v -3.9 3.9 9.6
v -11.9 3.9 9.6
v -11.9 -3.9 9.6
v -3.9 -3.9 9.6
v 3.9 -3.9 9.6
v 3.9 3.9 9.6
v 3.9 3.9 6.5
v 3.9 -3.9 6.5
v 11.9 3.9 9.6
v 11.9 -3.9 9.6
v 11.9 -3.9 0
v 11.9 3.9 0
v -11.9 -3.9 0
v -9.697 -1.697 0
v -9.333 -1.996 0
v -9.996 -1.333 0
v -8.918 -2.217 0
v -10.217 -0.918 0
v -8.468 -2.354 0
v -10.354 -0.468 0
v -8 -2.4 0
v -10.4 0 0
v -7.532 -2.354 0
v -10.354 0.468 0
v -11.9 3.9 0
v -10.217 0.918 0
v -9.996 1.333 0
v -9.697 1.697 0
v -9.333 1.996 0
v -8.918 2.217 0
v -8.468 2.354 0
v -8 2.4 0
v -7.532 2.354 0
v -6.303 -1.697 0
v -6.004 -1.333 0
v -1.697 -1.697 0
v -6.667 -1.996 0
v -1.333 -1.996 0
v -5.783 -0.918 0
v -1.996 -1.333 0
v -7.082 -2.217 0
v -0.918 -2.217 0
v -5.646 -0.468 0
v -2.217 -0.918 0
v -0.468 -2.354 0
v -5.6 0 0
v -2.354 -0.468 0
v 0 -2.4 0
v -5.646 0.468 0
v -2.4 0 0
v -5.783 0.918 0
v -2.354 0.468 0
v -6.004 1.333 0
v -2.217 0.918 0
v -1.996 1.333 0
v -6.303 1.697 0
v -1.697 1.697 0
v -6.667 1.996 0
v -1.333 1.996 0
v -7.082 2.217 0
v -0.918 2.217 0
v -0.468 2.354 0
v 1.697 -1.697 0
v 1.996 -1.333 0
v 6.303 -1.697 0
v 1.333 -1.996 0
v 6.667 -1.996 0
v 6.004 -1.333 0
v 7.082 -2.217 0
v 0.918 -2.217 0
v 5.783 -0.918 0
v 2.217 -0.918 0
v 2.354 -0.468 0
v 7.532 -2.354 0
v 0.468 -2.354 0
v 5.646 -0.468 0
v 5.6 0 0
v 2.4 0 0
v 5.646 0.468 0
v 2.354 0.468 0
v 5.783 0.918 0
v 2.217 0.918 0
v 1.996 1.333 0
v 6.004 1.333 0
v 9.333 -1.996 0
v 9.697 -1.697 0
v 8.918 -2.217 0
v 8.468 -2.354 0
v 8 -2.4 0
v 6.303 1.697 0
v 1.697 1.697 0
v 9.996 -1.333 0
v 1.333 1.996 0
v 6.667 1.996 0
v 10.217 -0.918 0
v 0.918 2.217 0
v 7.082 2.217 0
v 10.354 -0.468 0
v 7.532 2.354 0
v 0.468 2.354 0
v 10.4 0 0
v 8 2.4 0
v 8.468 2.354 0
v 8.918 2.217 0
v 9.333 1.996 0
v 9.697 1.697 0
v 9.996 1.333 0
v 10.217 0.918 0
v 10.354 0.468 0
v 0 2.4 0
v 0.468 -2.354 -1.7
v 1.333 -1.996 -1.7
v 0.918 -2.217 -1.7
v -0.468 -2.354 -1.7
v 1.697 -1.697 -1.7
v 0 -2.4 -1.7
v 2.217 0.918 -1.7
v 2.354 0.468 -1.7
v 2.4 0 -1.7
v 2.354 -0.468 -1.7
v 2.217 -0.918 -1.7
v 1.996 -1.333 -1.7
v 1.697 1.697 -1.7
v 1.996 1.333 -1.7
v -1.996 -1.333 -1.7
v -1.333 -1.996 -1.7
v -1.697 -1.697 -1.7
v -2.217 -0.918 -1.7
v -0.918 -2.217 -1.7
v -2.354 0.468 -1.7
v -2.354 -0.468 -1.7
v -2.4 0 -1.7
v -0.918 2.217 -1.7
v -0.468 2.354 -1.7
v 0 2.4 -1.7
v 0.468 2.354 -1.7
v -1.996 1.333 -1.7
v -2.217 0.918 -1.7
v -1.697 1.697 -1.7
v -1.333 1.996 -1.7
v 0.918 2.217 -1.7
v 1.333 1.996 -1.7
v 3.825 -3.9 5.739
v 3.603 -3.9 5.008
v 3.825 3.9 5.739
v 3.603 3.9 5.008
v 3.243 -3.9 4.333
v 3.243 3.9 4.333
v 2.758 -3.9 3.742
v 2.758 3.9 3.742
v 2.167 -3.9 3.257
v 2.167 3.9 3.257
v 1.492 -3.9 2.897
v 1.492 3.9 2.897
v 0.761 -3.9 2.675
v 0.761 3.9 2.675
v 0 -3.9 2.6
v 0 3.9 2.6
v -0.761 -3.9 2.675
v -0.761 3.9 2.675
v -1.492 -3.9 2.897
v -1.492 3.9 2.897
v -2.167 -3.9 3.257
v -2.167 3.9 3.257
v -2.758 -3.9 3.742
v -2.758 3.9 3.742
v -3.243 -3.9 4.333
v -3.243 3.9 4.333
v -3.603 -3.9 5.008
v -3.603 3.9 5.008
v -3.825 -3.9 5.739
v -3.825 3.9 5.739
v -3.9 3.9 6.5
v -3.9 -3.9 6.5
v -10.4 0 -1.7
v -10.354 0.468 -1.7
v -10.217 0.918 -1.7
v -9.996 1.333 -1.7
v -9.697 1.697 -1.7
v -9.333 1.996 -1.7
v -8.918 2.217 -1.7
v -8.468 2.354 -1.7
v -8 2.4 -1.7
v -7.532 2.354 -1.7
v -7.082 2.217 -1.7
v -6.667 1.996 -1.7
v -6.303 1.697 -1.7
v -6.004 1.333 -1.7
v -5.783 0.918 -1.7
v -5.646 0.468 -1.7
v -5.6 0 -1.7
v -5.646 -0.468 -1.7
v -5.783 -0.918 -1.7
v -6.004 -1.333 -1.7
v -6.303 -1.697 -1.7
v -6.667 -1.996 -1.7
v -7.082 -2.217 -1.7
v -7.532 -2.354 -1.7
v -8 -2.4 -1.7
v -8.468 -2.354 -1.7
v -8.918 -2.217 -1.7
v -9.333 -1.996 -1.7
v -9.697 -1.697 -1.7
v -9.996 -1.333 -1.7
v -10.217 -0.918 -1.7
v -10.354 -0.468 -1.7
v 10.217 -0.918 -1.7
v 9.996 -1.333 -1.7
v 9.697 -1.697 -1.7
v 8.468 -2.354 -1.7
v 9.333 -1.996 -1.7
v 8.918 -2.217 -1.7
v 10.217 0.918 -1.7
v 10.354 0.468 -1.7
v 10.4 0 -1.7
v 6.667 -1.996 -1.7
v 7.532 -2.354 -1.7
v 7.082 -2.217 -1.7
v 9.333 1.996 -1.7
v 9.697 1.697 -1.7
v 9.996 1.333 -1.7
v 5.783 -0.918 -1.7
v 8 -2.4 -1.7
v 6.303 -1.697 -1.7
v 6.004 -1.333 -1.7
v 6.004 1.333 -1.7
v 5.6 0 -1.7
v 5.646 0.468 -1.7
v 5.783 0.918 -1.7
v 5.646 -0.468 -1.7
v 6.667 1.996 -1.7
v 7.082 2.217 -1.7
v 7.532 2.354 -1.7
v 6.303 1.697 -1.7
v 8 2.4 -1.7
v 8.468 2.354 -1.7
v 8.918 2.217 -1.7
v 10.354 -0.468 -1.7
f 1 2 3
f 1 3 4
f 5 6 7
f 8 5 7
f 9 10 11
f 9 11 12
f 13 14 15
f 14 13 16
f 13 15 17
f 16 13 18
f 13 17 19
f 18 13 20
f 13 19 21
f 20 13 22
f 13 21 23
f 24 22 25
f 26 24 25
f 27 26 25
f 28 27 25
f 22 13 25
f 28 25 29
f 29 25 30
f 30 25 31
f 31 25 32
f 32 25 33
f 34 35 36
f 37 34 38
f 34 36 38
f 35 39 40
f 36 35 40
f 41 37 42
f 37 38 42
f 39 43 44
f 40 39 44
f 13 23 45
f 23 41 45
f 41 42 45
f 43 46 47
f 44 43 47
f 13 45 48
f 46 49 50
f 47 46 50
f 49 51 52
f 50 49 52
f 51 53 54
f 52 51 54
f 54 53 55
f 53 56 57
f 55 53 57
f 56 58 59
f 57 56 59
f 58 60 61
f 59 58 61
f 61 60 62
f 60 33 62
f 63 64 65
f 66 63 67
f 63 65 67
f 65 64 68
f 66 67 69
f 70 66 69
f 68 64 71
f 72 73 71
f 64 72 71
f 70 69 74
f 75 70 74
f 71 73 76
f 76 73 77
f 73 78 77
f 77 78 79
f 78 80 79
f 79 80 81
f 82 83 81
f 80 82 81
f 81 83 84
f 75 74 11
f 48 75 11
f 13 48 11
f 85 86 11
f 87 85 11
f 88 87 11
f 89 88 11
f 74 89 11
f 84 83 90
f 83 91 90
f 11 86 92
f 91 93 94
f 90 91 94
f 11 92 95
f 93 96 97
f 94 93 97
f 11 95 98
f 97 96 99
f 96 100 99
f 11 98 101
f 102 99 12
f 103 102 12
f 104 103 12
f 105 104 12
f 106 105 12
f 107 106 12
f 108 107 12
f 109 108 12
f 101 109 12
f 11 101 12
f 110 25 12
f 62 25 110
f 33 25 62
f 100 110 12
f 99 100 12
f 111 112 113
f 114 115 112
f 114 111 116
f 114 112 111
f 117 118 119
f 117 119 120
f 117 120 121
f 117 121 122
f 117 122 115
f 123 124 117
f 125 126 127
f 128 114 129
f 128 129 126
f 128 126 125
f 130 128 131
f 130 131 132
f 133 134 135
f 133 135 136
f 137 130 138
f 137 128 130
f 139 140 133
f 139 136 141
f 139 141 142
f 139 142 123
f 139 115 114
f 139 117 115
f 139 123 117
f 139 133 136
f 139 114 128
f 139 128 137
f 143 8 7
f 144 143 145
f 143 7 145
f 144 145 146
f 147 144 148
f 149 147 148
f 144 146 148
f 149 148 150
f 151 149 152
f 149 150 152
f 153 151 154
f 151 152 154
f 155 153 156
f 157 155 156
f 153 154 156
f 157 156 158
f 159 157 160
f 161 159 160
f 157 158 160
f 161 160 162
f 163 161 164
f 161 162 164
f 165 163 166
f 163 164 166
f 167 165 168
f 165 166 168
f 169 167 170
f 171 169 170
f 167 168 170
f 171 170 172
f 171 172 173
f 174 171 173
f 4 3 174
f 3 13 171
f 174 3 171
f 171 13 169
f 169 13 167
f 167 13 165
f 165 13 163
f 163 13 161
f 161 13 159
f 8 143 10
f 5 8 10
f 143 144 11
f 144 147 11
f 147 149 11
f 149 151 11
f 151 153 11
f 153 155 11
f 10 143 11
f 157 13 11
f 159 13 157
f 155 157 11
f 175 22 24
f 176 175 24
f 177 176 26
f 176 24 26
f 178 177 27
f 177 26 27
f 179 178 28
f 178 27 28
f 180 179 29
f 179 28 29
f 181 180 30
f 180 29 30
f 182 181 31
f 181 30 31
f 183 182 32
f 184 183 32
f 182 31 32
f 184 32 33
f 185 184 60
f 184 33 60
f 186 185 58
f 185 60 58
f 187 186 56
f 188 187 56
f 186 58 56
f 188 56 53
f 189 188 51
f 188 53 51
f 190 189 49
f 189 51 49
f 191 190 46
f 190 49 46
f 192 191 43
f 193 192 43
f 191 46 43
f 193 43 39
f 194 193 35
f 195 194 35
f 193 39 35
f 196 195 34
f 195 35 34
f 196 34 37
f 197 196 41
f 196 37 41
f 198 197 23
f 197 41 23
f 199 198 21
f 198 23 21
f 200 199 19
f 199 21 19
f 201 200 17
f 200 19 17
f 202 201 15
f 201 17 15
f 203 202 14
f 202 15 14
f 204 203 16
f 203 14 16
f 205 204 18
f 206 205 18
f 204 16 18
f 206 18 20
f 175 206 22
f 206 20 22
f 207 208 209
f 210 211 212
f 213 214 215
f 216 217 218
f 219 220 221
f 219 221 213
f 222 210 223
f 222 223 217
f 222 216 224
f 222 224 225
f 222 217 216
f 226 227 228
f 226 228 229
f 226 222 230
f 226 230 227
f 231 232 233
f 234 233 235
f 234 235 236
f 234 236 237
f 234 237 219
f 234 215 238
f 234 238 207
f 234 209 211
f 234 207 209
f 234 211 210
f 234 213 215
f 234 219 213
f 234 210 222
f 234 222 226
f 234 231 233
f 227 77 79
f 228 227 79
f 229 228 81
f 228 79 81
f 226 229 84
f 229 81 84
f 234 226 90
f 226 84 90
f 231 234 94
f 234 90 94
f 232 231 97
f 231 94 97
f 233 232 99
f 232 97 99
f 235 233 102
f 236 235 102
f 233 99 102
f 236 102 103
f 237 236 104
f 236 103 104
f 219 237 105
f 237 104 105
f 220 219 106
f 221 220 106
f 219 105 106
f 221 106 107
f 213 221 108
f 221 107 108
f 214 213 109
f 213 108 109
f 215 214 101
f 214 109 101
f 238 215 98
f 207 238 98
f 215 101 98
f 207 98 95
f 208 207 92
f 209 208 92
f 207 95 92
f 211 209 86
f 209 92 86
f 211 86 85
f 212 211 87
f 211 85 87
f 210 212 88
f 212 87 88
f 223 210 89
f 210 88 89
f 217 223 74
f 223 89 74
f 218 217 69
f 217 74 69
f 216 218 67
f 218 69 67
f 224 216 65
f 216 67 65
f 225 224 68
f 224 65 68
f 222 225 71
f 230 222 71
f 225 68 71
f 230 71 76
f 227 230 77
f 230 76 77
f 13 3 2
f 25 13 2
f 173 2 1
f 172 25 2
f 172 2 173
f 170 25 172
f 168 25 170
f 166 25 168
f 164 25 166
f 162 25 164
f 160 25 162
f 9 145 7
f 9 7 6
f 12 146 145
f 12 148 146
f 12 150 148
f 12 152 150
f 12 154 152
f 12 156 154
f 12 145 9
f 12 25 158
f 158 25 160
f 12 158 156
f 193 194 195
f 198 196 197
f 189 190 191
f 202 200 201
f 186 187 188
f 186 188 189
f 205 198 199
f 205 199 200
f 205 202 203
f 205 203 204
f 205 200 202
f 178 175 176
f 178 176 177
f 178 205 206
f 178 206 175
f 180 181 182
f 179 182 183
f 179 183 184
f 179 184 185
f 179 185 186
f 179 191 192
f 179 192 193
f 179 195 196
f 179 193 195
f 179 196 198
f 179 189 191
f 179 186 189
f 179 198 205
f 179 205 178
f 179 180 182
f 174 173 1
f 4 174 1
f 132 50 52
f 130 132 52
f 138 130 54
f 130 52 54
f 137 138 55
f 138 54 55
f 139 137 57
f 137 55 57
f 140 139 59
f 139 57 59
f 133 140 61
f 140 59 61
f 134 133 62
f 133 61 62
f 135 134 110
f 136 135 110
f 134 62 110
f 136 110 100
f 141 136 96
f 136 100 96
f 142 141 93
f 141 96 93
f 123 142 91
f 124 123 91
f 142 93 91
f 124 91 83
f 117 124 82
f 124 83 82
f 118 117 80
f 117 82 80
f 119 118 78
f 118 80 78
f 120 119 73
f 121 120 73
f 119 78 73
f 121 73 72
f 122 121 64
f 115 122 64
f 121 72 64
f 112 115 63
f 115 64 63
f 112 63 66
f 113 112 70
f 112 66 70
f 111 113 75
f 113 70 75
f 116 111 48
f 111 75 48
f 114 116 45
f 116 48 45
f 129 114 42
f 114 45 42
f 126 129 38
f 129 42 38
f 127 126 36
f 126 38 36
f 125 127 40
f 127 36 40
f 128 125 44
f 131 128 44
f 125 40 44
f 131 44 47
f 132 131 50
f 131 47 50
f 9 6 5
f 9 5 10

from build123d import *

# Parameters (mm, degrees)
SKETCH_1_W          = 23.8
SKETCH_1_H          = 7.8
EXTRUDE_1_DEPTH     = 9.6
SKETCH_2_R          = 2.4
EXTRUDE_2_DEPTH     = 1.7
CUT_EXTRUDE_1_DEPTH = 18.164206944


with BuildPart() as part:
    # Эскиз1 → Бобышка-Вытянуть1 (new body)
    with BuildSketch(Plane.XY):
        Rectangle(SKETCH_1_W, SKETCH_1_H)
    extrude(amount=EXTRUDE_1_DEPTH)

    # Эскиз2 → Бобышка-Вытянуть2 (add)
    with BuildSketch(Plane(origin=(0, 0, 0), x_dir=(-1, 0, 0), z_dir=(0, 0, -1))):
        Circle(SKETCH_2_R)
        with Locations((8, 0)):
            Circle(SKETCH_2_R)
        with Locations((-8, 0)):
            Circle(SKETCH_2_R)
    extrude(amount=EXTRUDE_2_DEPTH)

    # Эскиз3 → Вырез-Вытянуть1 (cut, through all)
    with BuildSketch(Plane(origin=(0, 3.9, 0), x_dir=(1, 0, 0), z_dir=(0, 1, 0))):
        with BuildLine():
            Line((-3.9, -16.6), (3.9, -16.6))
            Line((3.9, -16.6), (3.9, -6.5))
            ThreePointArc((3.9, -6.5), (0, -2.6), (-3.9, -6.5))
            Line((-3.9, -6.5), (-3.9, -16.6))
        make_face()
    extrude(amount=-CUT_EXTRUDE_1_DEPTH, mode=Mode.SUBTRACT)


solid = part.part
